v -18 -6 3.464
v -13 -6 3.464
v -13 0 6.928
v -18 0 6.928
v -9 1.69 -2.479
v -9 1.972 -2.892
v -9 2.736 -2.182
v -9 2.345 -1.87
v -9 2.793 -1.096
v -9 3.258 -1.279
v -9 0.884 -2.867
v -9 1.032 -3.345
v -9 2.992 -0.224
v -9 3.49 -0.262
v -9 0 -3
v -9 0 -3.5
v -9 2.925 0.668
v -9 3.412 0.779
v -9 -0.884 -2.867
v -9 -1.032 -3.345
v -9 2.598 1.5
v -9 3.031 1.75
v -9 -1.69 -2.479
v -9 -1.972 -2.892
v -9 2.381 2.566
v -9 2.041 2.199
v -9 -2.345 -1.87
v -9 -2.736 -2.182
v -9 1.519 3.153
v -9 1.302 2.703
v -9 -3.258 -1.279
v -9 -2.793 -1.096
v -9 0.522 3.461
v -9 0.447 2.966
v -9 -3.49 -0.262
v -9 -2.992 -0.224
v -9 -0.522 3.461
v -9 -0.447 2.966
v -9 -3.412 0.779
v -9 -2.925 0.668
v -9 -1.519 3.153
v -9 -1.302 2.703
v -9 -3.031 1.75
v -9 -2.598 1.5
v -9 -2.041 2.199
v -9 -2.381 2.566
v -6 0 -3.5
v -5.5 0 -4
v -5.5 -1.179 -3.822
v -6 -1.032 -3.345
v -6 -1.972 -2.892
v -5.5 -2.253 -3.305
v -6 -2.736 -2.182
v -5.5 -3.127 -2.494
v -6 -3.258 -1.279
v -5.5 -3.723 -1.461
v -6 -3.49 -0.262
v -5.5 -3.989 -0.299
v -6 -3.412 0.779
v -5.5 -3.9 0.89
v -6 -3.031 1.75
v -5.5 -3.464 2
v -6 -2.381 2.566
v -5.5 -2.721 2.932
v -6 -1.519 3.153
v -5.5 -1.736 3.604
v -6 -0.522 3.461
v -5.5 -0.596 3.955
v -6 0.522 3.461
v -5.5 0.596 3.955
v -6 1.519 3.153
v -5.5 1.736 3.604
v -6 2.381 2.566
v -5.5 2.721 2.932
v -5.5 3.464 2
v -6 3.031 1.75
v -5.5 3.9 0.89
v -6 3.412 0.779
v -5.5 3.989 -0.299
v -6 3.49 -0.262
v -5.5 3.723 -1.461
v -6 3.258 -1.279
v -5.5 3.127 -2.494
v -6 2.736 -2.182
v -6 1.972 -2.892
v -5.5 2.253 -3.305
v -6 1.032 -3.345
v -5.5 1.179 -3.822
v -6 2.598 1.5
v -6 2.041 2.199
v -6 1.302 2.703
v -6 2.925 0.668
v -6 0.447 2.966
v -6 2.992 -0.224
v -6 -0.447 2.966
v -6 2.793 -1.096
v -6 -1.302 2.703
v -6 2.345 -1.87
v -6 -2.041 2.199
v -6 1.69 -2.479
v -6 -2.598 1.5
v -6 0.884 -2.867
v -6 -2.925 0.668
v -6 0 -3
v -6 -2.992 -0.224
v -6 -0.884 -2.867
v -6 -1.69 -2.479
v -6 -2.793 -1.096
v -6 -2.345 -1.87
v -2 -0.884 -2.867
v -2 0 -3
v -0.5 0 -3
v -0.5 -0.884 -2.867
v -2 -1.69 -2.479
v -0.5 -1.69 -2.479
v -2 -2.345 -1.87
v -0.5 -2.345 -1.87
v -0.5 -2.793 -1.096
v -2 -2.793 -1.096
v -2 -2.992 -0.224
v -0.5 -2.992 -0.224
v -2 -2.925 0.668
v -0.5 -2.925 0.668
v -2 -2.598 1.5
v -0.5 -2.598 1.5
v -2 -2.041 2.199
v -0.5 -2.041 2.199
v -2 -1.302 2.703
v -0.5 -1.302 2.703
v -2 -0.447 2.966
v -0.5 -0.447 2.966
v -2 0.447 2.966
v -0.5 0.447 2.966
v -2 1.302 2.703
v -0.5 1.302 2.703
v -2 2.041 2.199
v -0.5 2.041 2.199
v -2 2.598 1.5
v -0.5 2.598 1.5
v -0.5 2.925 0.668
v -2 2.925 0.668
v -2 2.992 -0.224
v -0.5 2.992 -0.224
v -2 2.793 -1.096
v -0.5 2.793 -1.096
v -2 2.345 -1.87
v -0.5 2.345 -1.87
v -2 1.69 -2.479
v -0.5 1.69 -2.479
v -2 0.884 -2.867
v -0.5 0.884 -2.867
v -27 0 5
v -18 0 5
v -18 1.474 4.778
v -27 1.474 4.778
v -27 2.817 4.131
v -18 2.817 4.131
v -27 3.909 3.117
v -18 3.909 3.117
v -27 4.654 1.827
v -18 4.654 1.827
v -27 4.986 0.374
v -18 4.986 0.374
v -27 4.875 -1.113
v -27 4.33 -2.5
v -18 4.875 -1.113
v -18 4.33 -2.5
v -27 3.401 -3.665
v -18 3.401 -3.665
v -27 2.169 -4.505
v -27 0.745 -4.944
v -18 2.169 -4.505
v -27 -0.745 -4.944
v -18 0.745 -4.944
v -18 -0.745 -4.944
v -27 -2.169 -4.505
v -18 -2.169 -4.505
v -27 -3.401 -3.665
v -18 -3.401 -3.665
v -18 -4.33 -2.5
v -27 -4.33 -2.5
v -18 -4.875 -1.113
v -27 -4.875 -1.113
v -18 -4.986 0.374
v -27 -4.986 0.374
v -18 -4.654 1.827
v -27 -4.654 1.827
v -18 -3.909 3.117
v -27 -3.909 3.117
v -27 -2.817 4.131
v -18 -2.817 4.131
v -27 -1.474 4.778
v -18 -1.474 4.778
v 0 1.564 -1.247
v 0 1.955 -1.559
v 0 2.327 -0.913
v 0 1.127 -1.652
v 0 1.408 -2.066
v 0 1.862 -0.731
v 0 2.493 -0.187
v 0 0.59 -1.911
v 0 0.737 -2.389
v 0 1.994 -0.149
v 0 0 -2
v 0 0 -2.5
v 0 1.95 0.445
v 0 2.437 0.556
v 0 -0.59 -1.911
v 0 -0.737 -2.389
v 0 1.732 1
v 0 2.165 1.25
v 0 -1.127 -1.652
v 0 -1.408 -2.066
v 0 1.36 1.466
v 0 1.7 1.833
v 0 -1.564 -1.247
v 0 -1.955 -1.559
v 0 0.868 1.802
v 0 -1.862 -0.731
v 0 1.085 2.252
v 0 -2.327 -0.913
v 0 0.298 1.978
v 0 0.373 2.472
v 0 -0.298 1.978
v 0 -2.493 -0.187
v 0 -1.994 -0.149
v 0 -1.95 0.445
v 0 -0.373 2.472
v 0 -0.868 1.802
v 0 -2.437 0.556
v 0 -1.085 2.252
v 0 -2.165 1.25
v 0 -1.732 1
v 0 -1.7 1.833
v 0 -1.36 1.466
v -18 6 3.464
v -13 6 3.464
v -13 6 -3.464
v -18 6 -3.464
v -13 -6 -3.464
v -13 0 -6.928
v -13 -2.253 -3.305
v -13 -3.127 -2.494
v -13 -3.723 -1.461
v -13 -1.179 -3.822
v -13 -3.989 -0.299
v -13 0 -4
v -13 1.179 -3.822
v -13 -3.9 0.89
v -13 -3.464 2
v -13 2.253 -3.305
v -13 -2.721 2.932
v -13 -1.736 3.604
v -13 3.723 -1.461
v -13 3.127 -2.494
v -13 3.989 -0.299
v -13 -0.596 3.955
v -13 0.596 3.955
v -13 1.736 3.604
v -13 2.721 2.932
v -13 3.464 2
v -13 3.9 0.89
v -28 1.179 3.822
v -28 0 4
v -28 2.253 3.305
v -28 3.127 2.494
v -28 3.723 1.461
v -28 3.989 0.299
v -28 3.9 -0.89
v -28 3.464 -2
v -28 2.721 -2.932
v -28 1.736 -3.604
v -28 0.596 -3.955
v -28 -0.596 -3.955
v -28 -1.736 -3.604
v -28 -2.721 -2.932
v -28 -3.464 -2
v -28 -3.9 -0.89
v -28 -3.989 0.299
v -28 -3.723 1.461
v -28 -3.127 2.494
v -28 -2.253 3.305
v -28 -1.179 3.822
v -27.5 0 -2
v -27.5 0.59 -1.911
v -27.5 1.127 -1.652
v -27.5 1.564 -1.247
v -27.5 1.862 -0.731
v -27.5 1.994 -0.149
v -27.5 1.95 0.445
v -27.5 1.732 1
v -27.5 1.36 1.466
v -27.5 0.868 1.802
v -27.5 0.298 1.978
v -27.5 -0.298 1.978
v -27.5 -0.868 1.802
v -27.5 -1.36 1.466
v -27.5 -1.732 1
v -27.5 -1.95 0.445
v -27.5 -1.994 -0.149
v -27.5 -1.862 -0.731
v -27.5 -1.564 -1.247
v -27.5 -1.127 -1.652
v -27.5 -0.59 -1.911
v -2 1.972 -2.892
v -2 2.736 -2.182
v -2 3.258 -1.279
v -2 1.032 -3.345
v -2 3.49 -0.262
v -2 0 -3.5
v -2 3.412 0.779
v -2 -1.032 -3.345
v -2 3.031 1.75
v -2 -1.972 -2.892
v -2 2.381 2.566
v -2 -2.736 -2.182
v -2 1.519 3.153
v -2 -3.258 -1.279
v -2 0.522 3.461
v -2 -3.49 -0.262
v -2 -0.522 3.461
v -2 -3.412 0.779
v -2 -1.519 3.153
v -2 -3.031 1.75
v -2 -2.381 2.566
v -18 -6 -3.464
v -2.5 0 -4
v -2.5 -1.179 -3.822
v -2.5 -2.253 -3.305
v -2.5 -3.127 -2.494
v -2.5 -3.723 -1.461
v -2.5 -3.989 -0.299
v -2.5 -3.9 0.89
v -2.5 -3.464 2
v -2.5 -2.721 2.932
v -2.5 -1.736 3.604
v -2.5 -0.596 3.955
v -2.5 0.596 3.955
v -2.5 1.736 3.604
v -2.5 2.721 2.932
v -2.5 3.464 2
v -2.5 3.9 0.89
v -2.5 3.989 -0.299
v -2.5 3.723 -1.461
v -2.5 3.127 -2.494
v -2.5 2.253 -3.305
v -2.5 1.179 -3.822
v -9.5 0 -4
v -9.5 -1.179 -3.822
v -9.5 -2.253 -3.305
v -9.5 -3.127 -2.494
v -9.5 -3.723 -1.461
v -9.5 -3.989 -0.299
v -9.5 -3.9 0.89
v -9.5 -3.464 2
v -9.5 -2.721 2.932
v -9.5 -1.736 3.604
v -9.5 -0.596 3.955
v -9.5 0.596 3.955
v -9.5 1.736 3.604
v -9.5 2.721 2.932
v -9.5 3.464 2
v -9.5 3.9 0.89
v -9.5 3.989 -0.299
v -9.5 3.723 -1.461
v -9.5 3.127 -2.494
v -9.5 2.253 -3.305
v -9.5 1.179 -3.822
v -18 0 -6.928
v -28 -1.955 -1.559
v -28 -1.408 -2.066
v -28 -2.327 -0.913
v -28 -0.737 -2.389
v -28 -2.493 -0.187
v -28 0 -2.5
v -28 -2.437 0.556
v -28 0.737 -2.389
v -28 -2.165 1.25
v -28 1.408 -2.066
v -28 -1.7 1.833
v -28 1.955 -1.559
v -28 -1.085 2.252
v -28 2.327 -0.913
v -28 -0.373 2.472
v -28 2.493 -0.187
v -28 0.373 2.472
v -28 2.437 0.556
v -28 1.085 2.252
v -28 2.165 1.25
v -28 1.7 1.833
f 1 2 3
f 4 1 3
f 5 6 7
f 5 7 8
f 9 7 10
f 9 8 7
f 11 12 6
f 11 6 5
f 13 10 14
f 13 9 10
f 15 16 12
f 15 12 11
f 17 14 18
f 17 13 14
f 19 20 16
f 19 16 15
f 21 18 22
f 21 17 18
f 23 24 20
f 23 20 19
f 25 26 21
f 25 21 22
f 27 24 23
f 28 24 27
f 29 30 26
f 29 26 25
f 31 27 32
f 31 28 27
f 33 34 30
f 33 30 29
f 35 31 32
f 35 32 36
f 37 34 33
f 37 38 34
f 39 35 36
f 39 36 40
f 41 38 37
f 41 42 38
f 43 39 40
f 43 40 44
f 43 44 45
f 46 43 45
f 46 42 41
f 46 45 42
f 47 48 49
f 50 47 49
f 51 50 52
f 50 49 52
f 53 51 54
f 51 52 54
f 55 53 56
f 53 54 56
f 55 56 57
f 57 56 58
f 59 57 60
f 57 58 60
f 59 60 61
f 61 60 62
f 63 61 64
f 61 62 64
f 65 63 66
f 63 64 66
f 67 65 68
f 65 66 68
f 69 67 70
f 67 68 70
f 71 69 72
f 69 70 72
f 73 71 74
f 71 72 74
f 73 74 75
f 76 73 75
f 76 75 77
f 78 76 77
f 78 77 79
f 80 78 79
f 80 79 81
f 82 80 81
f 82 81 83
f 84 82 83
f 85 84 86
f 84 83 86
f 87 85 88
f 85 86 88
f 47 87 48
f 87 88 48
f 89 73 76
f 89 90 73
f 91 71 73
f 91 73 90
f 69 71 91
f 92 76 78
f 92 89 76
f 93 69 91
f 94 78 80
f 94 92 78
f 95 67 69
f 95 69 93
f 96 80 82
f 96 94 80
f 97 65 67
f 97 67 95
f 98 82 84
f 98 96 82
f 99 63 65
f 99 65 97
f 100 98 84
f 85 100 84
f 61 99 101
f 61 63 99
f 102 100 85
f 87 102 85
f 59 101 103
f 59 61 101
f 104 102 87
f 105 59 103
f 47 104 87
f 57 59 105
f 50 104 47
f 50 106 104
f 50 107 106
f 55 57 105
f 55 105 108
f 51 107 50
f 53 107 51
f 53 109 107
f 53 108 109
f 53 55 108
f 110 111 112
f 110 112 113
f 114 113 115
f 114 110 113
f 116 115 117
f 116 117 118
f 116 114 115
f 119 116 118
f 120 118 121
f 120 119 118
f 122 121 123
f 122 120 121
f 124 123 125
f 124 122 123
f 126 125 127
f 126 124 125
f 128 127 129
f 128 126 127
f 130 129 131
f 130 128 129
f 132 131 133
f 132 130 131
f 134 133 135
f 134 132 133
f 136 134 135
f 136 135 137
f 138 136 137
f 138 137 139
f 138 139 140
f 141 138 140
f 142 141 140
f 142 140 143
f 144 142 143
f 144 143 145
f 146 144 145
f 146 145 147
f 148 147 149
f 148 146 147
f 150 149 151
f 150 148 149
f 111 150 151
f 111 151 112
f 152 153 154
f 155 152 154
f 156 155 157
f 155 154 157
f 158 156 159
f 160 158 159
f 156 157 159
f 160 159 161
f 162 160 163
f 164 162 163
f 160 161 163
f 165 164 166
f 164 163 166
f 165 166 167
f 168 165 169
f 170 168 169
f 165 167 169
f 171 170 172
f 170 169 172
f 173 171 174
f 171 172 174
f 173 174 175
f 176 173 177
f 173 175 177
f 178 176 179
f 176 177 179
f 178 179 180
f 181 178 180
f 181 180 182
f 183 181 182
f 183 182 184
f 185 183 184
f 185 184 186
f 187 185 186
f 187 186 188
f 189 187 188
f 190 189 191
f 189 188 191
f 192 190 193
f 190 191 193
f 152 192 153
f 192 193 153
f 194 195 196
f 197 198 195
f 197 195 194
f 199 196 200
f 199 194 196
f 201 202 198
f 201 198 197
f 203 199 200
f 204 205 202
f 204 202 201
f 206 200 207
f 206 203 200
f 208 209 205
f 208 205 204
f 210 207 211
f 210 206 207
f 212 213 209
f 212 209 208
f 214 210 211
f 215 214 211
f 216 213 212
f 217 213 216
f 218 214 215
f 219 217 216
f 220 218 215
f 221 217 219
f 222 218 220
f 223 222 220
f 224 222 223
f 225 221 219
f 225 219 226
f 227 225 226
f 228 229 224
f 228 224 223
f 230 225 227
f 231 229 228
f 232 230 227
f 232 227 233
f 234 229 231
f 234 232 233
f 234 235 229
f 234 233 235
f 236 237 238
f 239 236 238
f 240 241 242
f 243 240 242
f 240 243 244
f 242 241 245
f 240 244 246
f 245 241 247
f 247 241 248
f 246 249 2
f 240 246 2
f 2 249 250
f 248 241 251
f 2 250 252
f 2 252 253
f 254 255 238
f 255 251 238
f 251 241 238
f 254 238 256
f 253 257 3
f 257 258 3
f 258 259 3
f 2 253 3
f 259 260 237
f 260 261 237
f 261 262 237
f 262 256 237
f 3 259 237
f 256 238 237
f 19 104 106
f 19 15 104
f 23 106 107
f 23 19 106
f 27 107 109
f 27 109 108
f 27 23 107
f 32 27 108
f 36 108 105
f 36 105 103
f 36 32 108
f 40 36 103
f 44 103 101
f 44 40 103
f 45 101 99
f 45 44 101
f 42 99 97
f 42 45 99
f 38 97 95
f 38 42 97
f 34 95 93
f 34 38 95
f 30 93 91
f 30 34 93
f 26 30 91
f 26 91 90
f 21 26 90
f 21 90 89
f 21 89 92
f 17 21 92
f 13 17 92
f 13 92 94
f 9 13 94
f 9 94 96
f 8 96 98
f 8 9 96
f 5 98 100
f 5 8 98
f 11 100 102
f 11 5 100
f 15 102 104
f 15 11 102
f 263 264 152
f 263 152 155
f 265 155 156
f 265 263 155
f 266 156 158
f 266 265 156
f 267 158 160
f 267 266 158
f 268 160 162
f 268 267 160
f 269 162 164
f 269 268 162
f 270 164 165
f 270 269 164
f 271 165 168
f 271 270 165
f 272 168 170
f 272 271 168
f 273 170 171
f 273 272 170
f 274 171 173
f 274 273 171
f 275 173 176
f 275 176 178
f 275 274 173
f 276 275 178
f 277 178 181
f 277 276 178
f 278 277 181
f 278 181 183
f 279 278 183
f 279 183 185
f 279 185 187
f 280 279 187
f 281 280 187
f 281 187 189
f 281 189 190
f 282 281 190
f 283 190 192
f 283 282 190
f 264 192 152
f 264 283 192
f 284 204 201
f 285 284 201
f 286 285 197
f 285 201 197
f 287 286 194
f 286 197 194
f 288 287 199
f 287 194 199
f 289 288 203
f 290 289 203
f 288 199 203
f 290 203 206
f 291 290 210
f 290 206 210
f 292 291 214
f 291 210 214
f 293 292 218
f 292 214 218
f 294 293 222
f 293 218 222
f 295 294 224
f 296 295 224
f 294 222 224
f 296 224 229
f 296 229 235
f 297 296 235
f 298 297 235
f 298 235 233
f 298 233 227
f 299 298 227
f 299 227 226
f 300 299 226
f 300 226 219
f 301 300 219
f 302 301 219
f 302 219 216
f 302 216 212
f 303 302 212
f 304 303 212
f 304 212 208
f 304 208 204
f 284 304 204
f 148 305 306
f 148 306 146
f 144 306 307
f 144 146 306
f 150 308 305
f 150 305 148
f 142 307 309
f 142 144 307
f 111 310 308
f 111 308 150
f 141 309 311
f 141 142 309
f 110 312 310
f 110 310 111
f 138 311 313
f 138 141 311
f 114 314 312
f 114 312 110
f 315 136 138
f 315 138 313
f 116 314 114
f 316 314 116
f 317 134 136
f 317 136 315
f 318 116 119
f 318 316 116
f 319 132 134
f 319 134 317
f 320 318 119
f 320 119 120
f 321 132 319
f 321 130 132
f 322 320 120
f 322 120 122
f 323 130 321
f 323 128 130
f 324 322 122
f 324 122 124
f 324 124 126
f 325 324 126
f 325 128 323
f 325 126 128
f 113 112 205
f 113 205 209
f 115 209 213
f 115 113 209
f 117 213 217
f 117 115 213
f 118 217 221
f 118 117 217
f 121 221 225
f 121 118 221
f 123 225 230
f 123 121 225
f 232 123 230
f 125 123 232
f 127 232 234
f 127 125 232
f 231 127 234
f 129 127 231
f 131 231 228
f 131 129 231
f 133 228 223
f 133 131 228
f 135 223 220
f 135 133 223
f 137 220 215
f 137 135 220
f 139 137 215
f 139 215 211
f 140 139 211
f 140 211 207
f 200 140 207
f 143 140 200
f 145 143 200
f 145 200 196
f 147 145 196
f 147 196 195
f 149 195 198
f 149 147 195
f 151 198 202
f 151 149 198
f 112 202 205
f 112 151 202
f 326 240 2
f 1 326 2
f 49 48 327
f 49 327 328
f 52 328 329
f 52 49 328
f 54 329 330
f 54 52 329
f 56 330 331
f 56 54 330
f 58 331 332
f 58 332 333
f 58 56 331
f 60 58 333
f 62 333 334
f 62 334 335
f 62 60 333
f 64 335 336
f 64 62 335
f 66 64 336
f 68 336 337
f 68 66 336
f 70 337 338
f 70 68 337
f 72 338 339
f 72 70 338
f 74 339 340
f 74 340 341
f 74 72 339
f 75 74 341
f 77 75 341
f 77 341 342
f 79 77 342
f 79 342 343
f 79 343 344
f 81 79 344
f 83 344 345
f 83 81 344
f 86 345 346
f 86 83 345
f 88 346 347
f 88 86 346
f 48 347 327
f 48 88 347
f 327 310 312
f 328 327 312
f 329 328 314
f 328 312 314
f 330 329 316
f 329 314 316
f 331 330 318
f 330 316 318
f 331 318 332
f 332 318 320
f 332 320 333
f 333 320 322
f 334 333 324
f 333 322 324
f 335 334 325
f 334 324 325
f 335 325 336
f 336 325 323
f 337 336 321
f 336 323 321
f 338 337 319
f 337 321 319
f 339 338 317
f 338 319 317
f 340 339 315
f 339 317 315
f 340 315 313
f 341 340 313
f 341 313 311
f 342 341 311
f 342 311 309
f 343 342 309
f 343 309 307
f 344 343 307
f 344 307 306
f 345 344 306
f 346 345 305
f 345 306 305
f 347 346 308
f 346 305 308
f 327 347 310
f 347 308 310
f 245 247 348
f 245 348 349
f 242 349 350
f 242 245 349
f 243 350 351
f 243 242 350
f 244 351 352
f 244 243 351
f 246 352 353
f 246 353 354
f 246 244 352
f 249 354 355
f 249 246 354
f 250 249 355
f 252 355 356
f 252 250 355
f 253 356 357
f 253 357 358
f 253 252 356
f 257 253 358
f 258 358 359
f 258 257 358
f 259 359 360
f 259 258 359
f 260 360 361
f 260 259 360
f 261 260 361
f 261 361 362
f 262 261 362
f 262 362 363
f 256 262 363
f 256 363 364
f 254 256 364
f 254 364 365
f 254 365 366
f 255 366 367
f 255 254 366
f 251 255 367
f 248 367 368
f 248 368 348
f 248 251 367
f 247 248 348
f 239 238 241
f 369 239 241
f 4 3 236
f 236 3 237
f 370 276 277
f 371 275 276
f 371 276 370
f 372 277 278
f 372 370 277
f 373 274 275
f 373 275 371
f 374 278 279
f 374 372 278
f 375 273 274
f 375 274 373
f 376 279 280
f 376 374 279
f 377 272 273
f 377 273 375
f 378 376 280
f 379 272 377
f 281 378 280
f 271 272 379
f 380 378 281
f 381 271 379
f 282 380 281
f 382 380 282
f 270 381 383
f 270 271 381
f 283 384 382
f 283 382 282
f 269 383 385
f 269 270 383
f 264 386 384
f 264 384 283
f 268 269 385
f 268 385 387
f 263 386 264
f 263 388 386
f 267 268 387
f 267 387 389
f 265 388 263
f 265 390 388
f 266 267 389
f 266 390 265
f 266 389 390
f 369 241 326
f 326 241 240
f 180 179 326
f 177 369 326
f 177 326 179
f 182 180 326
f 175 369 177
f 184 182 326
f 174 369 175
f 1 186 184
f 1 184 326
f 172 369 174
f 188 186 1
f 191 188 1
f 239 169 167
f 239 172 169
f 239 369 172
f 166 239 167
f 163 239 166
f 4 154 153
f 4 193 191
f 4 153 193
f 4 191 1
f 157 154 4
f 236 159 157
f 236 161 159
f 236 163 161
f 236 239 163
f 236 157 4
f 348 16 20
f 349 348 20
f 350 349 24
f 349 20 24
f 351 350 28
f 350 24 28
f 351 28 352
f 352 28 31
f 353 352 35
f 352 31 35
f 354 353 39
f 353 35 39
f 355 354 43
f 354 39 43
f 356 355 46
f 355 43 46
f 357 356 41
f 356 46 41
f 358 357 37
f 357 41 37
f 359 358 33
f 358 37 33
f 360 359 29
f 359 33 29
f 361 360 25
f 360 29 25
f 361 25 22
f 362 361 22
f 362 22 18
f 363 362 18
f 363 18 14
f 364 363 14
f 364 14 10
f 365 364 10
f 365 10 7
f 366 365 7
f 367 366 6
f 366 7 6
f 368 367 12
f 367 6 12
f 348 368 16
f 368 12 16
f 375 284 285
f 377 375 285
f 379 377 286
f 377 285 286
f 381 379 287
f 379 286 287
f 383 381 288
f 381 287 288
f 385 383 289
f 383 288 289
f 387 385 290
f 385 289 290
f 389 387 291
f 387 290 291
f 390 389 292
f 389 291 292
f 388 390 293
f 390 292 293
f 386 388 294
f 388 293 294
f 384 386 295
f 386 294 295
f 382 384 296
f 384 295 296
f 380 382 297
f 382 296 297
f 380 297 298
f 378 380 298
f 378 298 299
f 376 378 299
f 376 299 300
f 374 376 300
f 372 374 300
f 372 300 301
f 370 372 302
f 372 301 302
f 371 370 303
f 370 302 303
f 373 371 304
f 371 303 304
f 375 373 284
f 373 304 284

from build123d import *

# Parameters (mm, degrees)
BOSS_EXTRUDE1_DEPTH = 5
SKETCH3_R           = 5
BOSS_EXTRUDE2_DEPTH = 10
SKETCH4_R           = 2
CUT_EXTRUDE1_DEPTH  = 29
CHAMFER1_SIZE       = 0.5
CHAMFER2_SIZE       = 1


with BuildPart() as part:
    # Sketch1 → Revolve1 (revolve)
    with BuildSketch(Plane(origin=(0, 0, 0), x_dir=(1, 0, 0), z_dir=(0, 1, 0))):
        Polygon((0, 0), (0, 3), (-2, 3), (-2, 4), (-6, 4), (-6, 3), (-9, 3), (-9, 4), (-13, 4), (-13, 0), align=None)
    revolve(axis=Axis((8.879781421, 0, 0), (-1, 0, 0)))

    # Sketch2 → Boss-Extrude1 (add)
    with BuildSketch(Plane.ZY.offset(13)):
        Polygon((6.92820323, 0), (3.464101615, 6), (-3.464101615, 6), (-6.92820323, 0), (-3.464101615, -6), (3.464101615, -6), align=None)
    extrude(amount=BOSS_EXTRUDE1_DEPTH)

    # Sketch3 → Boss-Extrude2 (add)
    with BuildSketch(Plane.ZY.offset(18)):
        Circle(SKETCH3_R)
    extrude(amount=BOSS_EXTRUDE2_DEPTH)

    # Sketch4 → Cut-Extrude1 (cut, through all)
    with BuildSketch(Plane(origin=(0, 0, 0), x_dir=(0, 0, -1), z_dir=(1, 0, 0))):
        Circle(SKETCH4_R)
    extrude(amount=-CUT_EXTRUDE1_DEPTH, mode=Mode.SUBTRACT)

    # Chamfer1
    chamfer1_edges = [part.edges().sort_by_distance(p)[0] for p in [
        (-6, 0, 4),
        (-2, 0, 4),
        (0, 0, 3),
        (-28, 0, 2),
        (-9, 0, 4),
    ]]
    chamfer(chamfer1_edges, length=CHAMFER1_SIZE)

    # Chamfer2
    chamfer2_edges = [part.edges().sort_by_distance(p)[0] for p in [
        (-28, 0, -5),
    ]]
    chamfer(chamfer2_edges, length=CHAMFER2_SIZE)


solid = part.part
